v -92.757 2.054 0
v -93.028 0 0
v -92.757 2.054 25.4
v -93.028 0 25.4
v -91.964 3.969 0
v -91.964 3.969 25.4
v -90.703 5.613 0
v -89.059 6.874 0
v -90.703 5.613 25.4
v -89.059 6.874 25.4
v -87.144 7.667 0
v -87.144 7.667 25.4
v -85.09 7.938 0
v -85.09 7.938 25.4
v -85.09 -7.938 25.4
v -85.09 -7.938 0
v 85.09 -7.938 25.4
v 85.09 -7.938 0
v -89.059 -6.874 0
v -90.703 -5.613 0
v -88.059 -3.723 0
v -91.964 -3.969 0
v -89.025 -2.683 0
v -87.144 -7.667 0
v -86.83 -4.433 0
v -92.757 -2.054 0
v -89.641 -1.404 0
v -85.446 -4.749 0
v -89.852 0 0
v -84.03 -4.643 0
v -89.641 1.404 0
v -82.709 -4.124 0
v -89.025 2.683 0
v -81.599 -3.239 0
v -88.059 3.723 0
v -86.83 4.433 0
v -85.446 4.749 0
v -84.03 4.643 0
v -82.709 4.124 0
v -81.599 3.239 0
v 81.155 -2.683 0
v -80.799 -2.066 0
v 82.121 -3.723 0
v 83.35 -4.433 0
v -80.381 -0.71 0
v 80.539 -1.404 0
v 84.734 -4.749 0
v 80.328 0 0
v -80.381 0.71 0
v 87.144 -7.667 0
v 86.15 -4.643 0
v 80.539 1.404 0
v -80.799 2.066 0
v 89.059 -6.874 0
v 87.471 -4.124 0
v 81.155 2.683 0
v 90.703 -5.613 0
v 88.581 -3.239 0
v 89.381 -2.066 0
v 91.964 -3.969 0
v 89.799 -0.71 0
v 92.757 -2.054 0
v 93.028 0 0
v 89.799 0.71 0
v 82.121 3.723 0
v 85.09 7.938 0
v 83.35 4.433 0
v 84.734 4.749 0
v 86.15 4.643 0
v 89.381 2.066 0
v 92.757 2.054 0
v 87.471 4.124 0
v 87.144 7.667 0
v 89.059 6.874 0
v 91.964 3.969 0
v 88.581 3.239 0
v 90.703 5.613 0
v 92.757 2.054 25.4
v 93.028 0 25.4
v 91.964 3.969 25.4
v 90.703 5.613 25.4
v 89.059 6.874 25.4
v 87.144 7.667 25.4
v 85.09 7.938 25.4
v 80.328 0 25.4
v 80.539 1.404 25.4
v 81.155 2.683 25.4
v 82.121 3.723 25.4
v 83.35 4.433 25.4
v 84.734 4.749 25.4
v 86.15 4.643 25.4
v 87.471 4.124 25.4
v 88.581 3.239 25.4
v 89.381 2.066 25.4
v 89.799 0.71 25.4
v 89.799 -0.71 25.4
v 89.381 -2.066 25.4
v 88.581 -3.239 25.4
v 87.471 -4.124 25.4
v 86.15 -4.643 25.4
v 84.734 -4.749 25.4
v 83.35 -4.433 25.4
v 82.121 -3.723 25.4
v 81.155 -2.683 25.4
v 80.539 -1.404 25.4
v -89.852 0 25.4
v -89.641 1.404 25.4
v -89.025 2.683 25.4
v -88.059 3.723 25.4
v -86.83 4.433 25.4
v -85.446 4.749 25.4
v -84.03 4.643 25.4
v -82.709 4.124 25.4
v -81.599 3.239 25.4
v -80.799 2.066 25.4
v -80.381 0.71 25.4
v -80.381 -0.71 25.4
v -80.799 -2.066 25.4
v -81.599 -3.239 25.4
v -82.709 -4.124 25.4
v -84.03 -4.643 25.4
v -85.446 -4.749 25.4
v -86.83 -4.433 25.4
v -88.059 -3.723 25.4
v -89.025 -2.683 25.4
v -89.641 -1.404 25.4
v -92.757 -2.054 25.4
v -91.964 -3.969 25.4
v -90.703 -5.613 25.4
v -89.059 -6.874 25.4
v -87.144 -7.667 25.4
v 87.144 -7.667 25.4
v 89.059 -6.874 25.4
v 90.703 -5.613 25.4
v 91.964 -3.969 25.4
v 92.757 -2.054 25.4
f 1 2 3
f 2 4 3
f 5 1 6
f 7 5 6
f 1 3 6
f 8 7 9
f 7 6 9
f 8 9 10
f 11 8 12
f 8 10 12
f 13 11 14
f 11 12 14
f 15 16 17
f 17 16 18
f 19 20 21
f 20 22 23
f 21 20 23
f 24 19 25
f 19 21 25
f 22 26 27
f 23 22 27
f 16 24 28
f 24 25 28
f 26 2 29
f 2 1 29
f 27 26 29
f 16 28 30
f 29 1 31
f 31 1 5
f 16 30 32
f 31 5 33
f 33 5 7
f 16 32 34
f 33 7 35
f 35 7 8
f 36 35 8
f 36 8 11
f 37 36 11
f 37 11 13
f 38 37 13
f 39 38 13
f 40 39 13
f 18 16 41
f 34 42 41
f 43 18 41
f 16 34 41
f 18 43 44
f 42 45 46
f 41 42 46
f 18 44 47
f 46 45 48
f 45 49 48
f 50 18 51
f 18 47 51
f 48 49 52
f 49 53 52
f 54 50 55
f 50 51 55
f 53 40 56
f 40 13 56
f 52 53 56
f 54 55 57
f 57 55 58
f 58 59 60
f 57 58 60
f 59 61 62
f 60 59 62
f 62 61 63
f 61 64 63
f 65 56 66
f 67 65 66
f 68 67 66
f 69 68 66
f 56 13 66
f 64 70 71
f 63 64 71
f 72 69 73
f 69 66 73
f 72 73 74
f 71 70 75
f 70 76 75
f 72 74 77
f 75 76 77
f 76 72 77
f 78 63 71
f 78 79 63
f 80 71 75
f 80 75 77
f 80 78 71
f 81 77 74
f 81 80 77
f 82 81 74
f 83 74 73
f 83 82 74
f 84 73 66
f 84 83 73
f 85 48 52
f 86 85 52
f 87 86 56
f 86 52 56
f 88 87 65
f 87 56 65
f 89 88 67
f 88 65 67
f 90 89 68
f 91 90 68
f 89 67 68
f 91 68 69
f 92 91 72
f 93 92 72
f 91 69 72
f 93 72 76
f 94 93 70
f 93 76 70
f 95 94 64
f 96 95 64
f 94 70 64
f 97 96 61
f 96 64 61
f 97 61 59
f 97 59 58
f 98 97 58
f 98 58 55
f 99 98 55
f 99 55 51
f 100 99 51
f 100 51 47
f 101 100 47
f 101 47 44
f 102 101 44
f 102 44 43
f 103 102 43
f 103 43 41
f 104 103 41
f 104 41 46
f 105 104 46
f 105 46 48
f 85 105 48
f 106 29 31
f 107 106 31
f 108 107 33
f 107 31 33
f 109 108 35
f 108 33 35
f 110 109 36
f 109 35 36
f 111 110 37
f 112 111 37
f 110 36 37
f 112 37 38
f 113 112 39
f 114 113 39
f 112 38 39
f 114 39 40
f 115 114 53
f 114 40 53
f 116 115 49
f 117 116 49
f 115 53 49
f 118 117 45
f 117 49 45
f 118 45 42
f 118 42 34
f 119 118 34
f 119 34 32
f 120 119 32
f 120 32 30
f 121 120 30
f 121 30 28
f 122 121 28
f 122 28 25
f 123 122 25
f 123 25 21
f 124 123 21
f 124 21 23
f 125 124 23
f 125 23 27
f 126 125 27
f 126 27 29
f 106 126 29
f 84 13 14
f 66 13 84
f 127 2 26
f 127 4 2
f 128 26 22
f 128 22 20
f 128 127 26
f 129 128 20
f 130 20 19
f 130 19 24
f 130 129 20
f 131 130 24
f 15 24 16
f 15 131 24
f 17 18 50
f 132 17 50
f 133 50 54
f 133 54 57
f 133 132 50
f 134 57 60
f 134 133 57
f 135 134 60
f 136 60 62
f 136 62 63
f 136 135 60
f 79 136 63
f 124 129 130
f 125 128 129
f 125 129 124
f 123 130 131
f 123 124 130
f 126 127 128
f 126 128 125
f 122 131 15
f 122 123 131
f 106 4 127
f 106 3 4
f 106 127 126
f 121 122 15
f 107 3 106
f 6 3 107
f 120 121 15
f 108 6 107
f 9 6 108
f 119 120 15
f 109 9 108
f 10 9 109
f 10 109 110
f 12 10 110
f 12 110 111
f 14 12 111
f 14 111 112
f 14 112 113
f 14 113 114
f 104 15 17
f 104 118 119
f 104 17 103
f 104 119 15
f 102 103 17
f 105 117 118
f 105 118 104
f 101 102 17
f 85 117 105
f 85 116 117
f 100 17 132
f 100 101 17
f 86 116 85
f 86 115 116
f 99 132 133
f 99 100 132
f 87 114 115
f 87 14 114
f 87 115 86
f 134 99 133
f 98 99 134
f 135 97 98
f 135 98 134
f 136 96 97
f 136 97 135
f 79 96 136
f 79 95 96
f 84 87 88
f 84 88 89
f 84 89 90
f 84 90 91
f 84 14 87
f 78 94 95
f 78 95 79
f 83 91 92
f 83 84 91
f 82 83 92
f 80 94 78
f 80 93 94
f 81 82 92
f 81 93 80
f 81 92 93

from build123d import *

# Parameters (mm, degrees)
F0_W     = 186.055
F0_H     = 15.875
F1_DEPTH = 25.4
F2_R     = 7.93749
F4_D     = 9.525


# Not quite as in the source:
# - a fillet or chamfer is up to 0.001 mm smaller than in the source, because OpenCascade refuses the exact size


with BuildPart() as f1:
    # F0 (on Top) → F1 (new body)
    with BuildSketch(Plane.XY):
        Rectangle(F0_W, F0_H)
    extrude(amount=F1_DEPTH)

    # F2 (radius 7.9375 in the source; OpenCascade refuses exactly that, so slightly less here)
    f2_edges = [f1.edges().sort_by_distance(p)[0] for p in [
        (-93.0275, -7.9375, 12.7),
        (-93.0275, 7.9375, 12.7),
        (93.0275, -7.9375, 12.7),
        (93.0275, 7.9375, 12.7),
    ]]
    fillet(f2_edges, radius=F2_R)

    # F4 (through all)
    with Locations(Plane.XY.offset(25.4)):
        with Locations((-85.09, 0), (85.09, 0)):
            Hole(F4_D / 2)


solid = f1.part
